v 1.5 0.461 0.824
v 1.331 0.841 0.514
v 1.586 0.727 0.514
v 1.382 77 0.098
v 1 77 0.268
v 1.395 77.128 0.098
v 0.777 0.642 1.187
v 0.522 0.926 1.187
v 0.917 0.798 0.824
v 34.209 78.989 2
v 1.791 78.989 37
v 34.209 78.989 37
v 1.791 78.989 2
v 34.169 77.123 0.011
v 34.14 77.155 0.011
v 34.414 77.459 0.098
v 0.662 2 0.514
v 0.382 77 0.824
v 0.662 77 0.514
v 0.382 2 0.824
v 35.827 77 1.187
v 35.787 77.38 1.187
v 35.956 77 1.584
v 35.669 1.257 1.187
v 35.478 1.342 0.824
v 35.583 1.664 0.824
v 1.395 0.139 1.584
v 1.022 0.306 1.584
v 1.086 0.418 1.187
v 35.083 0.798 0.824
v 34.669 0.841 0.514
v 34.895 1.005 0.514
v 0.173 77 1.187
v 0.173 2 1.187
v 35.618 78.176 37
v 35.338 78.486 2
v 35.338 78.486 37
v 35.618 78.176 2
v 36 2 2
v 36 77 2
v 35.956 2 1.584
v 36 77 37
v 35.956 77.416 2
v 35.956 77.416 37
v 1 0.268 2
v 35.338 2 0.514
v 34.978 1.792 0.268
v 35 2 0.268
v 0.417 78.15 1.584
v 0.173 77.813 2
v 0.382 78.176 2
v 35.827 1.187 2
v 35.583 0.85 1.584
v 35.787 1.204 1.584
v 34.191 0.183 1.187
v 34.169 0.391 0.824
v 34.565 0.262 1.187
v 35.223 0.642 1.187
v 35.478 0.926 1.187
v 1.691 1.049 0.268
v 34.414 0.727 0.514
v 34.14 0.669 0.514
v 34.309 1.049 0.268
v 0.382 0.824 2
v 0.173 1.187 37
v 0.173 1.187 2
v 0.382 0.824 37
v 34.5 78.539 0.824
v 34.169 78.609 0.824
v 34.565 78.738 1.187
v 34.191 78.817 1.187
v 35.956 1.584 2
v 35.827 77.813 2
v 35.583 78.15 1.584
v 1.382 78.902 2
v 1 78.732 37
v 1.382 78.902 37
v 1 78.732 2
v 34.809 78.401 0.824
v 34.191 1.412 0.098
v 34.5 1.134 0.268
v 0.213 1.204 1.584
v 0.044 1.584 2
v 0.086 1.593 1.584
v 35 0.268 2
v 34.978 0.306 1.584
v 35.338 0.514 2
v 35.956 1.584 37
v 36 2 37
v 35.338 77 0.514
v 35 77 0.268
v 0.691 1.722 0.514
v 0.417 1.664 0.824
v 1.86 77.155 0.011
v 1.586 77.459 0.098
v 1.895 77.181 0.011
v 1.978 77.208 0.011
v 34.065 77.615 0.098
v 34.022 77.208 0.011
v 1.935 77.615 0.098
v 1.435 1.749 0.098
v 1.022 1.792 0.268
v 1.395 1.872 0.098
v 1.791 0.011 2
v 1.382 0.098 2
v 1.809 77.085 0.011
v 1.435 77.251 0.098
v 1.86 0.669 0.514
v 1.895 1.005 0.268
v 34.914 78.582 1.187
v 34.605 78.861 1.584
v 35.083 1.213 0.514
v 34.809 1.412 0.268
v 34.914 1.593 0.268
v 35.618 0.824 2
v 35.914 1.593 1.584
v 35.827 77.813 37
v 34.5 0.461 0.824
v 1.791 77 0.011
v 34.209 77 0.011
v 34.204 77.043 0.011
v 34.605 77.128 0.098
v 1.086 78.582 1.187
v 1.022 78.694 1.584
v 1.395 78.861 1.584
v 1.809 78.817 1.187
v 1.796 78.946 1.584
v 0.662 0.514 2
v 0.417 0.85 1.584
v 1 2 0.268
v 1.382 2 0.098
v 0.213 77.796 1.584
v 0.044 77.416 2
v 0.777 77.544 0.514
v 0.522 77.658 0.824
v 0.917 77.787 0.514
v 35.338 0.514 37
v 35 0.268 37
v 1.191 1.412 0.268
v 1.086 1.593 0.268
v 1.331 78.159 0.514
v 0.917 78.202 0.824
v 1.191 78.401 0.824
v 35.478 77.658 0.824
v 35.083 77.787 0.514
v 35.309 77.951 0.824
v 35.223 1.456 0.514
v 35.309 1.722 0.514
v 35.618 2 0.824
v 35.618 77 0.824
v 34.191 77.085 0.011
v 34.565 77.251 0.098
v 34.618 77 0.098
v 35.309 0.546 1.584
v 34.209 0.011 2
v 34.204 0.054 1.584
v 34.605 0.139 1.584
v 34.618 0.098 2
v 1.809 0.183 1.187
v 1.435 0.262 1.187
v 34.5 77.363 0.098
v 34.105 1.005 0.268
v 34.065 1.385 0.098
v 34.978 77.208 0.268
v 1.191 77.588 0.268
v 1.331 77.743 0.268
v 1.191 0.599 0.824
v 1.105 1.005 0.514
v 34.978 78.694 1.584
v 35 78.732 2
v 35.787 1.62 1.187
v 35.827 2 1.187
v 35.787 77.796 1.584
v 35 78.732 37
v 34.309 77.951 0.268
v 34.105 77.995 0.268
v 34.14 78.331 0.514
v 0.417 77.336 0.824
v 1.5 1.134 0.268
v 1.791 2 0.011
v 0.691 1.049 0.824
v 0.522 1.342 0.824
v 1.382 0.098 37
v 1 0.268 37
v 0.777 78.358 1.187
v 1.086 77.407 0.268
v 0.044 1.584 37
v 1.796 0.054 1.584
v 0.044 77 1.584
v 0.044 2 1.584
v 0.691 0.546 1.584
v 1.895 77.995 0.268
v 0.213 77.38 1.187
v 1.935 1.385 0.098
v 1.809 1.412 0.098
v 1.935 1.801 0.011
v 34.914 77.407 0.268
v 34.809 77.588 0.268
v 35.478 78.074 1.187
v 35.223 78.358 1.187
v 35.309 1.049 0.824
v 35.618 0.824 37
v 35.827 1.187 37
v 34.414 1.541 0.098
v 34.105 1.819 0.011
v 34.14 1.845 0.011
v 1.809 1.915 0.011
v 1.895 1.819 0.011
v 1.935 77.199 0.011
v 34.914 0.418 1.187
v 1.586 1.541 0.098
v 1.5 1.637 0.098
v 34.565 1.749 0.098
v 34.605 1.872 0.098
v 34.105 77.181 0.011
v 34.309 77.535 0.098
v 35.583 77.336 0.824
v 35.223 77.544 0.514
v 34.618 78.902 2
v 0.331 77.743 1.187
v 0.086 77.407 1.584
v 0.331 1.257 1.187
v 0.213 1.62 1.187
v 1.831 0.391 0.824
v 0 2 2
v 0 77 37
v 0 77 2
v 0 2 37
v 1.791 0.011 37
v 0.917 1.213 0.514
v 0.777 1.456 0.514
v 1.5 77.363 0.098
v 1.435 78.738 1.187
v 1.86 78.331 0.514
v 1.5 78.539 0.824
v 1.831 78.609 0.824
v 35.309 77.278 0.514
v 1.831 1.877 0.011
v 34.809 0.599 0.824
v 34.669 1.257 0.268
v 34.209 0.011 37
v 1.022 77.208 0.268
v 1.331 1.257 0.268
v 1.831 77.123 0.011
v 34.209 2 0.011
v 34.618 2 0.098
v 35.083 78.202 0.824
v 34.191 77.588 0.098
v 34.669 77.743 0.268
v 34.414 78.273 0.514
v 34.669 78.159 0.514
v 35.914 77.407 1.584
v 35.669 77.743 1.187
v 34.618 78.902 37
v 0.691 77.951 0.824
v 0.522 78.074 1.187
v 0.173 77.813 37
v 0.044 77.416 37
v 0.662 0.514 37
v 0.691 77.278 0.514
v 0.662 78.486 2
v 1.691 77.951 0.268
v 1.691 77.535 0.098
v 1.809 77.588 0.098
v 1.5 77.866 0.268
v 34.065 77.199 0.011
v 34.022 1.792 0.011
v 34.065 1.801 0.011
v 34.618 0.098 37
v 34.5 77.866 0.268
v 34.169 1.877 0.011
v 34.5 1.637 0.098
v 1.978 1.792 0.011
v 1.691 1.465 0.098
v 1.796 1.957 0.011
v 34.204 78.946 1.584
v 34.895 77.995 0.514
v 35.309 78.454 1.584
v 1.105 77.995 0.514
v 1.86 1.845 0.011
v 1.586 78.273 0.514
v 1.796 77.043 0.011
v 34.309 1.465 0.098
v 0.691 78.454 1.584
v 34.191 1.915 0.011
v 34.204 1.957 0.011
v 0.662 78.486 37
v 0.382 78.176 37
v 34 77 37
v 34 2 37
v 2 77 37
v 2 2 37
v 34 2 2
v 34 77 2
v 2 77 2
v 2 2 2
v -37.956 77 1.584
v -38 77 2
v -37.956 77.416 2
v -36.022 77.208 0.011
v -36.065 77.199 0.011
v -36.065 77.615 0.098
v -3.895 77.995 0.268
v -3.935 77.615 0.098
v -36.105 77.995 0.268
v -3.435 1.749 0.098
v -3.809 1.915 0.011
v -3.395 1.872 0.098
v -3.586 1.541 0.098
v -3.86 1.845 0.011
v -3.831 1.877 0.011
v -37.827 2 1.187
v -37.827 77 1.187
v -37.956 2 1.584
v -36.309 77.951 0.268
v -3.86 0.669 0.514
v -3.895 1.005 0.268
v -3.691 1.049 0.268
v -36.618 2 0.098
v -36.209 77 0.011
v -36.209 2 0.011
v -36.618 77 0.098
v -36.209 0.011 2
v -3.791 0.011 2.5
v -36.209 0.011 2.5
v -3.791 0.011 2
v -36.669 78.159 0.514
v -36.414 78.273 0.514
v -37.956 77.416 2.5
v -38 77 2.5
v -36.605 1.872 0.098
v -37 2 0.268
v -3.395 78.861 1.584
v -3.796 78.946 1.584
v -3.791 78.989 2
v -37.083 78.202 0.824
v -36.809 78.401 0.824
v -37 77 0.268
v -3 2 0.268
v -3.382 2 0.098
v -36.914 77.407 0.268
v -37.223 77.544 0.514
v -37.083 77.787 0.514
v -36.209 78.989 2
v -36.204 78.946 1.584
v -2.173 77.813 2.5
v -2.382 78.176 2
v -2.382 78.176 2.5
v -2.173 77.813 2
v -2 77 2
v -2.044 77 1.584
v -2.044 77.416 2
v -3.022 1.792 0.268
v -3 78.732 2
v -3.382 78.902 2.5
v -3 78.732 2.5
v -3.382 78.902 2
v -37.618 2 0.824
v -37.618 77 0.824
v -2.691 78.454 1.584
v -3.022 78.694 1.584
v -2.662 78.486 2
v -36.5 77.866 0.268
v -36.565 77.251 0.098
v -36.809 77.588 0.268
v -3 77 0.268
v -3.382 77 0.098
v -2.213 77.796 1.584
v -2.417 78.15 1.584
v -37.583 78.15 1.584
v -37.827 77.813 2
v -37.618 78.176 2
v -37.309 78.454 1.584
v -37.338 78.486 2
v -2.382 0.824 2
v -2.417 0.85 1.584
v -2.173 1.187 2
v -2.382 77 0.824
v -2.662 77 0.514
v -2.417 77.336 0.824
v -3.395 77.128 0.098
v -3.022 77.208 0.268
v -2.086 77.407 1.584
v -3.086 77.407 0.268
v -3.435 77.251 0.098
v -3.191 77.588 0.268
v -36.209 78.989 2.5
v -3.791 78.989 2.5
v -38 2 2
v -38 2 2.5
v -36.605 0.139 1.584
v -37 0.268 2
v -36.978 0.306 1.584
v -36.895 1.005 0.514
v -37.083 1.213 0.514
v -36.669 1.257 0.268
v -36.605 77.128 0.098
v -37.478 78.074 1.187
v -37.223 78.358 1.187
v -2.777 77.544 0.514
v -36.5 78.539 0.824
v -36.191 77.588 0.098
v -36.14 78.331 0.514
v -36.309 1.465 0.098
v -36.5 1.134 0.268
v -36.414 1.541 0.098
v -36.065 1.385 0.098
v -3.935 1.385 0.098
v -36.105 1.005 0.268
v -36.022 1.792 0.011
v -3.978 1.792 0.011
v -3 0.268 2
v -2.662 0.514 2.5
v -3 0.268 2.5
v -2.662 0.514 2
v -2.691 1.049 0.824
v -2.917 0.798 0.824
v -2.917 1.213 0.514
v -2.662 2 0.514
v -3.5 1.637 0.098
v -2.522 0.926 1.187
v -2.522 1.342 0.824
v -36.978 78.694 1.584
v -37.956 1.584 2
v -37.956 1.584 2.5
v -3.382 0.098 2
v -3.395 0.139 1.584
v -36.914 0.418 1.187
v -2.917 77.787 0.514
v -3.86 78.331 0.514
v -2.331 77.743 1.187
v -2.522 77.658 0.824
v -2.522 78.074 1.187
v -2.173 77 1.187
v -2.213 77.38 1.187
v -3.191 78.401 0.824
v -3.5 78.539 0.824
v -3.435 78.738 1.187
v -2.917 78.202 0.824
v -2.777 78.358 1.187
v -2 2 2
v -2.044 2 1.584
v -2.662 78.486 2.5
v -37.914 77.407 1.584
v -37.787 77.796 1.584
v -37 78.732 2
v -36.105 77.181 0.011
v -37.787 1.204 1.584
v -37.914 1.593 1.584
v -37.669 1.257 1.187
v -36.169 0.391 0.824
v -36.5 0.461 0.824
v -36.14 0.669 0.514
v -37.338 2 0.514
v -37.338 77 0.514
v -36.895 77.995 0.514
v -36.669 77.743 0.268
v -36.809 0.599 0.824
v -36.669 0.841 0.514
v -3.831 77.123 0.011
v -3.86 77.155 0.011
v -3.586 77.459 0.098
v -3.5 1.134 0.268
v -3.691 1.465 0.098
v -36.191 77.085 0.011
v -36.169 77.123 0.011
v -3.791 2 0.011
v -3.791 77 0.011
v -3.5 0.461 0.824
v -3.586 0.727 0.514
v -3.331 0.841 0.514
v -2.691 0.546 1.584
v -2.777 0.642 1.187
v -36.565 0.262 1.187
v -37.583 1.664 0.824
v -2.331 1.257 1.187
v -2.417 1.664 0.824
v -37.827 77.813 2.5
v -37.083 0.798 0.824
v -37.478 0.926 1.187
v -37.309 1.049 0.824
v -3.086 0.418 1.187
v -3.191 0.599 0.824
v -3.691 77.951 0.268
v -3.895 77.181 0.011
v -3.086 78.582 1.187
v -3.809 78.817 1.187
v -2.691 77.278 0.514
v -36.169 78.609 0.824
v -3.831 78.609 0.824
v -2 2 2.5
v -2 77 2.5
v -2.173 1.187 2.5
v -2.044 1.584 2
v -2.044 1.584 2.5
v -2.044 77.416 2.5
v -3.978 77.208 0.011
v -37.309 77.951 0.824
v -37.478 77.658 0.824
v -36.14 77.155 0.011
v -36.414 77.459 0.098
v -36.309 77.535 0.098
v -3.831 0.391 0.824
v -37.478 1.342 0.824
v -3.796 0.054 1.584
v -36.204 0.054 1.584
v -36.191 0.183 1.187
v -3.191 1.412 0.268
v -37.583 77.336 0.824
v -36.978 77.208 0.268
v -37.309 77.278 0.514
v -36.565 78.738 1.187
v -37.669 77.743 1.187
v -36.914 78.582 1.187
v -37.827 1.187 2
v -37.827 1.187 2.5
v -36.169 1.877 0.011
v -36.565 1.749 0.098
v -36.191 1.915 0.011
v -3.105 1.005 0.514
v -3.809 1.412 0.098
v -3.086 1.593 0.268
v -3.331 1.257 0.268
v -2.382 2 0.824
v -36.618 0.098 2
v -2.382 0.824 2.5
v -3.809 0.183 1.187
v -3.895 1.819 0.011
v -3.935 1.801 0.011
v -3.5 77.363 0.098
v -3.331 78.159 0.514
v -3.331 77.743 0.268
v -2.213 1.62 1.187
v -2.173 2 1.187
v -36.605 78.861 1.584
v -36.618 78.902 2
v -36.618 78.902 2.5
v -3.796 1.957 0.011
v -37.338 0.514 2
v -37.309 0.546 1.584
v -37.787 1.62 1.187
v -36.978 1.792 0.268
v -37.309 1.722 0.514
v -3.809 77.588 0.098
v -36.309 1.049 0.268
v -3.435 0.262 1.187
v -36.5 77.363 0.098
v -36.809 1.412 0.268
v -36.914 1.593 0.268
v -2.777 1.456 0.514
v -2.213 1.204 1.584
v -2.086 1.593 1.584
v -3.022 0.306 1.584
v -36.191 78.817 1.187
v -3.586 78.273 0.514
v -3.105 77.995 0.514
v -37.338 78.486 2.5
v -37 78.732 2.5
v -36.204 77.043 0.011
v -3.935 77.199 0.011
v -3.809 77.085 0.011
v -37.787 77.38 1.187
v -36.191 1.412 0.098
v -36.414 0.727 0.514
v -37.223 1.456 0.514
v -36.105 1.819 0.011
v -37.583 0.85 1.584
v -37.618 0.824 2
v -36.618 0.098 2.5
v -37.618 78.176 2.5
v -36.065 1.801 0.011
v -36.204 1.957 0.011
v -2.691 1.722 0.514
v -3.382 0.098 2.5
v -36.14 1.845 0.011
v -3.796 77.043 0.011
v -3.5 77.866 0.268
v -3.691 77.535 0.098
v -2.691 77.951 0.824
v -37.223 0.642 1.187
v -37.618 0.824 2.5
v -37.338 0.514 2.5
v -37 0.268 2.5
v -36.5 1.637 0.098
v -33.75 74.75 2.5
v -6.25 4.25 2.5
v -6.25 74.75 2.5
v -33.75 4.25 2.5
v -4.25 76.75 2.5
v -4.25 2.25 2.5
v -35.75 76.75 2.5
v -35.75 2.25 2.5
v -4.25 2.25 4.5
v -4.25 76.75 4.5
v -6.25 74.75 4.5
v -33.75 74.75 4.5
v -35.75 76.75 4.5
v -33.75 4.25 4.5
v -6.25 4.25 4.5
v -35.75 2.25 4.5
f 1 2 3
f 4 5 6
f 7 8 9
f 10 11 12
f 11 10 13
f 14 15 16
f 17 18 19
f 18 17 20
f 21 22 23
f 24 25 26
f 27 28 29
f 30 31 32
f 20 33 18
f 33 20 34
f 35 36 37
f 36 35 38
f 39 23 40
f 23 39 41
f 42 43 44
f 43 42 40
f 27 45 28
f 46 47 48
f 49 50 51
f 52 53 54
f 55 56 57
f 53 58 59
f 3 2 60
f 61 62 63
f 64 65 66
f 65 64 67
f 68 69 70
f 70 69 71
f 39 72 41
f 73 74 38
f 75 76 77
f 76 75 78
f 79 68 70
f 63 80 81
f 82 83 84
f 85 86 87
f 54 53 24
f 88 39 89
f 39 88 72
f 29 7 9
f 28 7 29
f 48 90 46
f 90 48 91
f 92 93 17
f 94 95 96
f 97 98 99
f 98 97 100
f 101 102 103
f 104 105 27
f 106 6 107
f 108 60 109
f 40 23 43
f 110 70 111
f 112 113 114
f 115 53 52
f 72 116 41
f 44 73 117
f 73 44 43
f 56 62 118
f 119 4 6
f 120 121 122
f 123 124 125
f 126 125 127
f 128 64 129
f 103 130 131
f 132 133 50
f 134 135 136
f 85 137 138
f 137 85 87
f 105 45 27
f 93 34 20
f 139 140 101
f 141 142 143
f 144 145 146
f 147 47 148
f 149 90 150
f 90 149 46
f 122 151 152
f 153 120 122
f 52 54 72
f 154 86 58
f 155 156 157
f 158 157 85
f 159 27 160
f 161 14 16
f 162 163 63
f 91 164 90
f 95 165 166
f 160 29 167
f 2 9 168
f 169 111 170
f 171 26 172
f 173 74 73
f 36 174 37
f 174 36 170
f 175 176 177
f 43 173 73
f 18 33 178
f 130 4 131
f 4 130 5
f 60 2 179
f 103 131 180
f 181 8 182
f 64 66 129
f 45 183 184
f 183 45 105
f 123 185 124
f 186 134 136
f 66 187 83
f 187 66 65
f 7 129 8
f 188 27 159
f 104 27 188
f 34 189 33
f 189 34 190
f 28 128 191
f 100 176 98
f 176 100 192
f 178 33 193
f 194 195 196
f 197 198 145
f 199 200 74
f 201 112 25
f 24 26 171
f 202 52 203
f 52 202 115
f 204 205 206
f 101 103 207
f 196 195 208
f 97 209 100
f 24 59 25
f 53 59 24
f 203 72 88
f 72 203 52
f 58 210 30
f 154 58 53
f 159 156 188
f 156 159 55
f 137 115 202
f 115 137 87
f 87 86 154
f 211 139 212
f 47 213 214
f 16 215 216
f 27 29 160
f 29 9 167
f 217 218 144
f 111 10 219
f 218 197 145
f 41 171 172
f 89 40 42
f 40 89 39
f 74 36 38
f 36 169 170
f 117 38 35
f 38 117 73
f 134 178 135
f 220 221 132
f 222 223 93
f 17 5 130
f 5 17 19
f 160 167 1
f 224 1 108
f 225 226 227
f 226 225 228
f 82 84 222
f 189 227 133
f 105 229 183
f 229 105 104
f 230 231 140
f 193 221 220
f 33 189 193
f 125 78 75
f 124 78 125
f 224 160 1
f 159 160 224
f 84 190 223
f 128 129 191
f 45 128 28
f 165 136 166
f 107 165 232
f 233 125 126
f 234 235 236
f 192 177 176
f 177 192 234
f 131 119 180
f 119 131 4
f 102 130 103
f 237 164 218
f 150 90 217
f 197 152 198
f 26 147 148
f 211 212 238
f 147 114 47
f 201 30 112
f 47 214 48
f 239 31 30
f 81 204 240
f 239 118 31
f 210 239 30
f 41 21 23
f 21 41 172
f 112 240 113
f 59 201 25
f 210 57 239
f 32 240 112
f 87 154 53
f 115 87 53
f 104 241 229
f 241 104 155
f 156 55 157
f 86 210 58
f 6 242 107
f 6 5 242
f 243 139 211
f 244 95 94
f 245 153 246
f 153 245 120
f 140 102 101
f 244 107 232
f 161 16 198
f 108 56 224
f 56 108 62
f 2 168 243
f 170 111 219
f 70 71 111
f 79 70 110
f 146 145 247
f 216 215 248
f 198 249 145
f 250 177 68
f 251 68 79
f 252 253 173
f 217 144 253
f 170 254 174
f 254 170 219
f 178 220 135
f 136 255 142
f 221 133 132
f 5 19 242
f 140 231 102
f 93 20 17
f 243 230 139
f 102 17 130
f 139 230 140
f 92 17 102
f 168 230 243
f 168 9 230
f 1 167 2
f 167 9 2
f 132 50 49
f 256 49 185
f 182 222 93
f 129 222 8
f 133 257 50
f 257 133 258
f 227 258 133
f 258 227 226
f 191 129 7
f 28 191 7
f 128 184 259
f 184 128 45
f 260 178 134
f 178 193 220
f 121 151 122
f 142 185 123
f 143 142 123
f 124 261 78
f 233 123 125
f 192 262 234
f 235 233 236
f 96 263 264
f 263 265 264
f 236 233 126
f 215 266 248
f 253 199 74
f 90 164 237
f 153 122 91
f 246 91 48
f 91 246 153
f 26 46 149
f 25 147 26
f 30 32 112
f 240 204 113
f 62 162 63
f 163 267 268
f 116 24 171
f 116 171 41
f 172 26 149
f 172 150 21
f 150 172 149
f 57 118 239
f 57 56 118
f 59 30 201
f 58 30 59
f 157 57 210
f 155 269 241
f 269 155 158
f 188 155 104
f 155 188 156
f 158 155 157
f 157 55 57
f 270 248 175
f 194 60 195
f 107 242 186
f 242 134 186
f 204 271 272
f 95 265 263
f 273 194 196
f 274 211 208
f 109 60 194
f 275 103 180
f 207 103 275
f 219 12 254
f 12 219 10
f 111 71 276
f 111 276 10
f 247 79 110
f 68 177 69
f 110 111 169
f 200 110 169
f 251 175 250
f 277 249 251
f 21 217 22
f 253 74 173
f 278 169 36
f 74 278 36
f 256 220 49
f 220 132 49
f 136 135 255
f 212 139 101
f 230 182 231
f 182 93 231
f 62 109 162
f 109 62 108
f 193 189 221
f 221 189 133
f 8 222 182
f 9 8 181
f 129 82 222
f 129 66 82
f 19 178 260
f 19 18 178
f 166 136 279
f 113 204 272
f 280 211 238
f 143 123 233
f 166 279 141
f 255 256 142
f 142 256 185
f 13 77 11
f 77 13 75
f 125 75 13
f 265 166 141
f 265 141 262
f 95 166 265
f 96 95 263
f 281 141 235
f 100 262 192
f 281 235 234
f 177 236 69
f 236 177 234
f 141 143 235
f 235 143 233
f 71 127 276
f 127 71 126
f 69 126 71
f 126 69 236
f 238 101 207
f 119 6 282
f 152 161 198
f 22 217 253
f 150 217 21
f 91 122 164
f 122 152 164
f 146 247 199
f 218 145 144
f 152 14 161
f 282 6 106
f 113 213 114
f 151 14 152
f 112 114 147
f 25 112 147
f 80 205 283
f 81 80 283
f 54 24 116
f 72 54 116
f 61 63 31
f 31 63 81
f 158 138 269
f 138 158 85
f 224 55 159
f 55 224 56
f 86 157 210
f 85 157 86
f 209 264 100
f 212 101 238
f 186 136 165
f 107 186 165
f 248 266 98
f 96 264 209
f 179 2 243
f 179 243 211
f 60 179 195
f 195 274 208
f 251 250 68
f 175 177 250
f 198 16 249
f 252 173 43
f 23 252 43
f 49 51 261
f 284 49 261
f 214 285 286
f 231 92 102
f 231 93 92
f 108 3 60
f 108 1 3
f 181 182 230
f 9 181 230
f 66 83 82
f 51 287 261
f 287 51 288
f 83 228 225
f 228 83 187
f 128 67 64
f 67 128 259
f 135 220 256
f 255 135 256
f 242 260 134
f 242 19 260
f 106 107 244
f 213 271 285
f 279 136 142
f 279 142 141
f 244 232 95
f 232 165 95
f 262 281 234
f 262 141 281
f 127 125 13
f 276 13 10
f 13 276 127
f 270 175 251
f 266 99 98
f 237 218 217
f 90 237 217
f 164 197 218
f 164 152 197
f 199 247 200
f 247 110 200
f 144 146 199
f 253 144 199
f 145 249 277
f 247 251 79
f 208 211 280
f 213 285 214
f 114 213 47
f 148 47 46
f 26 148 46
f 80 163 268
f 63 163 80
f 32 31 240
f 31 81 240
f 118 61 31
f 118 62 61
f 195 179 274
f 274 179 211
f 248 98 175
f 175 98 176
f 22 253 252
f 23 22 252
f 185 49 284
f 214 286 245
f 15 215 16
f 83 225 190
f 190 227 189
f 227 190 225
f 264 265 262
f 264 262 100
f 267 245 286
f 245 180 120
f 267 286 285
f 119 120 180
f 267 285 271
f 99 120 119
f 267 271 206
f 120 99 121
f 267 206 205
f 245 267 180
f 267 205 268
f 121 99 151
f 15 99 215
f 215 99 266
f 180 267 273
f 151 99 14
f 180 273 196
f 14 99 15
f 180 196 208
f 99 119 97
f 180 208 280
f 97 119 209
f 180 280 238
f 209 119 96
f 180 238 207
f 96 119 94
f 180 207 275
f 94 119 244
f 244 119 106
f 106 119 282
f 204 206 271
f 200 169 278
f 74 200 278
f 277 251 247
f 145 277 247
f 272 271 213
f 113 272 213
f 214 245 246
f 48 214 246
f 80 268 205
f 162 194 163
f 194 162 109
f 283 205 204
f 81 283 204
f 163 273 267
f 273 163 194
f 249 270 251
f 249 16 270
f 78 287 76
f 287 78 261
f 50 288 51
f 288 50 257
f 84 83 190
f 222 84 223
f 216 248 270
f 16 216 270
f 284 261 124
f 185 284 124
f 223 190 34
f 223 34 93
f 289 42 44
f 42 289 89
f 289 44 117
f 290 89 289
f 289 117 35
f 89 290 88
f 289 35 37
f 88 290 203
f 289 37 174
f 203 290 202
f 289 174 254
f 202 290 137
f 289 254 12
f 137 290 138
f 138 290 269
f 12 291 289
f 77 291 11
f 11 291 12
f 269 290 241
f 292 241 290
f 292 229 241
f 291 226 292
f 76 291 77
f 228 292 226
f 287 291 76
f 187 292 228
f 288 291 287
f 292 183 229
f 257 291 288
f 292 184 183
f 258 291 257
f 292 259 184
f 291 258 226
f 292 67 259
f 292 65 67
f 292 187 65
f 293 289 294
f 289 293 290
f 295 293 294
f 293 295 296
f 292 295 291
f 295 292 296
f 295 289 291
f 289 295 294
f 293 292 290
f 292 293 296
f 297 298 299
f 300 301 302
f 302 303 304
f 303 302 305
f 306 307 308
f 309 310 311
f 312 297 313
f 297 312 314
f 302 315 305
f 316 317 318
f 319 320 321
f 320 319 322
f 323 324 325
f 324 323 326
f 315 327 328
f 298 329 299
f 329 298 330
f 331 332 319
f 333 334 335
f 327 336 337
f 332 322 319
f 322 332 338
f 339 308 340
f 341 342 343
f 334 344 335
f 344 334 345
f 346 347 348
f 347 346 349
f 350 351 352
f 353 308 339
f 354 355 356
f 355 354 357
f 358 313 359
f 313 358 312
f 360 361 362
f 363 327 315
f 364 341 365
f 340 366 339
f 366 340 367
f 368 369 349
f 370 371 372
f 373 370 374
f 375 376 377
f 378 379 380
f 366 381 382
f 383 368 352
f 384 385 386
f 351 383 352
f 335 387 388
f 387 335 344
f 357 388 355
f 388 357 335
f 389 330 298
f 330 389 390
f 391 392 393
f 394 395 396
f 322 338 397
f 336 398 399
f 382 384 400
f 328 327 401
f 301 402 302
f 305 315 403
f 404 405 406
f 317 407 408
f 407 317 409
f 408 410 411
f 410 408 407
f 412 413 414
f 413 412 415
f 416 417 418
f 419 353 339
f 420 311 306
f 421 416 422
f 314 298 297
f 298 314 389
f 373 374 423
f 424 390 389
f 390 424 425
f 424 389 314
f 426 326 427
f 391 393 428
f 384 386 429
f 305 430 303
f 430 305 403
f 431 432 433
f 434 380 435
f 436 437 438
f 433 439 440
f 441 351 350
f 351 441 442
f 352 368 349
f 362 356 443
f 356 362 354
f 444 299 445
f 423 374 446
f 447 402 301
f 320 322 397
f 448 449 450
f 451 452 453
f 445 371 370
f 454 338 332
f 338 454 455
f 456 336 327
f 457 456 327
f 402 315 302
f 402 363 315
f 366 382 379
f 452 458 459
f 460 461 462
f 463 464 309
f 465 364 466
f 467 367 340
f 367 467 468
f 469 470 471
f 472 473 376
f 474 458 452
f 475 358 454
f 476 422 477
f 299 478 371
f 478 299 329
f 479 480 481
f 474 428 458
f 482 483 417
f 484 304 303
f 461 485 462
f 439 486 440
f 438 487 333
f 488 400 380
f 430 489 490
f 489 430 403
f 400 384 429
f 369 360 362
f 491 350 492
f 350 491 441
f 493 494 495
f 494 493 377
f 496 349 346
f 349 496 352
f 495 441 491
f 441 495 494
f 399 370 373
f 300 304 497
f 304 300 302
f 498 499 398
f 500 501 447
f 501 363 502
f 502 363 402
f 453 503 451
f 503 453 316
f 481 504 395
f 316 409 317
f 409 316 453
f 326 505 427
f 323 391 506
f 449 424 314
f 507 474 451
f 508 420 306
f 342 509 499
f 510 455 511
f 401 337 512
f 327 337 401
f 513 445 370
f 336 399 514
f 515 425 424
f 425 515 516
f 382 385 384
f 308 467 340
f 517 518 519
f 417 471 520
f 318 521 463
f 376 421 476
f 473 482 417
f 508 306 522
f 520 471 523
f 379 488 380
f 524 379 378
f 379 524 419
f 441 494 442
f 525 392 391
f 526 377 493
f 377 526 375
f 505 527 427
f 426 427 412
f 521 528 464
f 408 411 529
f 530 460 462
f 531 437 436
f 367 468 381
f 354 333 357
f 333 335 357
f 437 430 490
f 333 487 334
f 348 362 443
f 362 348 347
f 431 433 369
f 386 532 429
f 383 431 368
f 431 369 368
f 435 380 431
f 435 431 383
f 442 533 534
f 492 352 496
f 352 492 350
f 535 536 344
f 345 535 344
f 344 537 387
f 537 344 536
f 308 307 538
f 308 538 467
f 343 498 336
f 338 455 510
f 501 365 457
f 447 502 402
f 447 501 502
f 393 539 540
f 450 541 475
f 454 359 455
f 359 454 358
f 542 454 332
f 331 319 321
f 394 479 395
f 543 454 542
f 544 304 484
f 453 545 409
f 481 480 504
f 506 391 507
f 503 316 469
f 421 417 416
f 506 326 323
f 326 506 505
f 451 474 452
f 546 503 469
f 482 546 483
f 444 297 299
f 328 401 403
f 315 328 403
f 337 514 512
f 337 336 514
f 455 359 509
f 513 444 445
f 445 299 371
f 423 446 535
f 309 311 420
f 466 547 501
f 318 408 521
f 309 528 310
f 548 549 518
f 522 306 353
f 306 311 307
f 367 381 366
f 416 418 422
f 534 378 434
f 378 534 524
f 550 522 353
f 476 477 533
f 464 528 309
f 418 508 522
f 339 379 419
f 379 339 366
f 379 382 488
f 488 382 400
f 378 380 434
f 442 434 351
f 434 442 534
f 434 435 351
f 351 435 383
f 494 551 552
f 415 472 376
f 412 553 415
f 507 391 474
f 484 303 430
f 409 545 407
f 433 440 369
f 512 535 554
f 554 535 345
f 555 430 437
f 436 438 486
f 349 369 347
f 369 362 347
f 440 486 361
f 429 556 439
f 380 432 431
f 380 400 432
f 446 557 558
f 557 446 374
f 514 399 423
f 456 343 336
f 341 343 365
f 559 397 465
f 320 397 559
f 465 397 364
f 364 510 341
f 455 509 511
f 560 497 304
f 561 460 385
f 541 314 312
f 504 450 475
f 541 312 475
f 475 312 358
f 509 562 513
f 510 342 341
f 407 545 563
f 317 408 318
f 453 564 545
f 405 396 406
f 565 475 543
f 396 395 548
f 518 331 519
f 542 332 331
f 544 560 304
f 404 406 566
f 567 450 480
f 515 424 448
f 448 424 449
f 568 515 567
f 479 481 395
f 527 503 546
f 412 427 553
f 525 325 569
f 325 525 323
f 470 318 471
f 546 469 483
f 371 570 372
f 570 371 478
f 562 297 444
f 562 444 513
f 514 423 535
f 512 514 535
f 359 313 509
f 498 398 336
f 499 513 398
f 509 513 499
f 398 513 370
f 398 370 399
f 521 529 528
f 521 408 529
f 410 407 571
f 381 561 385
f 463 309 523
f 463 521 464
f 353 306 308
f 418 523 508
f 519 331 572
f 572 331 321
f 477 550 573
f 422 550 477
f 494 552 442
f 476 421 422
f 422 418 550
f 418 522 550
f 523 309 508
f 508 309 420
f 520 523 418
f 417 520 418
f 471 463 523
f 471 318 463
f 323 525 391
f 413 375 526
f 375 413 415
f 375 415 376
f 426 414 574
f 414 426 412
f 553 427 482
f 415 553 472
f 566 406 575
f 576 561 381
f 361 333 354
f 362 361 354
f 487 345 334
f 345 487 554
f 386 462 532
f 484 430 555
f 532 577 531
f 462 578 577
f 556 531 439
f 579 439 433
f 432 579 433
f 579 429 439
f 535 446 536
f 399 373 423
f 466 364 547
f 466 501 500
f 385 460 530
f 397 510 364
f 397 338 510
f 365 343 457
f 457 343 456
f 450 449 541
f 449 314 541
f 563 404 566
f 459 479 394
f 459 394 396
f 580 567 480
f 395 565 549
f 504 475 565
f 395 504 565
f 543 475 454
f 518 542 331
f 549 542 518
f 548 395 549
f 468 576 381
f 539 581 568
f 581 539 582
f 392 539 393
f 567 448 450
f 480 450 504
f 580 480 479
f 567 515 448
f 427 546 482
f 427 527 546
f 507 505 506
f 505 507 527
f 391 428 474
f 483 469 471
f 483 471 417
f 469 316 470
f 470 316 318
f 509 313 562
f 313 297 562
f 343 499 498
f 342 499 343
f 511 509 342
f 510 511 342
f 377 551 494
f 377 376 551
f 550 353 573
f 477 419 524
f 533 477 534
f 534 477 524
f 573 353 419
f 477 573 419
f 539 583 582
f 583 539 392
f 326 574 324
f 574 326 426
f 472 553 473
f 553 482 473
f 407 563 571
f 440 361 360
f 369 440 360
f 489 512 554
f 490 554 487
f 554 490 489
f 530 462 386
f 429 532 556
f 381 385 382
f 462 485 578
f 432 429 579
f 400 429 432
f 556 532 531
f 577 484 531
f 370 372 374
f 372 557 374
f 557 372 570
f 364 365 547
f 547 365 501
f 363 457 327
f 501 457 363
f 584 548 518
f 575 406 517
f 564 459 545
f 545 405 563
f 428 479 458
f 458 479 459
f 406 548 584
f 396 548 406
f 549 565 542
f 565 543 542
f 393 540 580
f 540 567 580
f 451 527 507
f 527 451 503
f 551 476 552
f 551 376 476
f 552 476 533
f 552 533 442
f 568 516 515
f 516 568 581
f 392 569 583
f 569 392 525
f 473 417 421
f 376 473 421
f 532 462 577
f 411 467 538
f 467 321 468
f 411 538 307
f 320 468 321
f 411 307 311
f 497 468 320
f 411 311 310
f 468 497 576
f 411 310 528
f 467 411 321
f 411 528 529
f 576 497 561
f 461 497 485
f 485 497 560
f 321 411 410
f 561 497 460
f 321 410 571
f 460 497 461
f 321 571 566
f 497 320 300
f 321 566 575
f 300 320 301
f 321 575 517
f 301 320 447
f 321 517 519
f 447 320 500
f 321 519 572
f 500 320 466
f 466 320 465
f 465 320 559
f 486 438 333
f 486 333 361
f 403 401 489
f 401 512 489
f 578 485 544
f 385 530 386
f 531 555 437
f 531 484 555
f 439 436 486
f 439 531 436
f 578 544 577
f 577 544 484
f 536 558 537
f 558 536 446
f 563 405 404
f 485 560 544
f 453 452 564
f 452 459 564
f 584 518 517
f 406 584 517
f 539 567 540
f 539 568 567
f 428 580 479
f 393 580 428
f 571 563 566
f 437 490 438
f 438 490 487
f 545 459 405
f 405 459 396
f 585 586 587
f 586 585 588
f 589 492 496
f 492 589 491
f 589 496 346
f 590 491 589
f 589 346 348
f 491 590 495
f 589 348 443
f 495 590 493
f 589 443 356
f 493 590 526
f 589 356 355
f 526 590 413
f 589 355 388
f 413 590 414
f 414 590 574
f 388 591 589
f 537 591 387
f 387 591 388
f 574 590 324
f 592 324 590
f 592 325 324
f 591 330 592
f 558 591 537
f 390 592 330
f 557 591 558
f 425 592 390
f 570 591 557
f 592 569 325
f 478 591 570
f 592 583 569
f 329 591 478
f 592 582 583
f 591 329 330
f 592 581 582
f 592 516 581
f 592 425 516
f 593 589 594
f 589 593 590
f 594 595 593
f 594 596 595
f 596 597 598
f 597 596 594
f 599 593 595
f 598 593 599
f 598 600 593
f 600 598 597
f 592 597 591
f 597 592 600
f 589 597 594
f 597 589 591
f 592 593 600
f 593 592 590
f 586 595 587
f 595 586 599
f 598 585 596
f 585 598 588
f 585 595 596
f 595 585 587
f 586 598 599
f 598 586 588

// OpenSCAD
//Procedural Project Box v1
//CudaTox, 2017

inside_width = 32;
inside_length = 75;
inside_height = 35;
thickness = 2;                  //Wall thickness
radius = 2;                     //Fillet radius. Should not be larger than thickness
extra_lid_thickness = 0.5;      //Extra lid thickness above thickness. 
                                //You may wan to tweak this to account for large chamfer radius.

outside_width = inside_width + thickness * 2;
outside_length = inside_length + thickness * 2;


module rounded_box(x,y,z,r){
    translate([r,r,r])
    minkowski(){
        cube([x-r*2,y-r*2,z-r*2]);
        sphere(r=r, $fs=0.1);
    }
}

module main_box(){
    difference(){
        //cube([outside_width, outside_length, inside_height + thickness * 2]);
        difference(){
            rounded_box(outside_width, outside_length, inside_height + thickness + 2, radius);
            translate([0,0,inside_height + thickness])
            cube([outside_width, outside_length, inside_height + thickness * 2]);
        }
        translate([thickness, thickness, thickness])
        cube([inside_width, inside_length, inside_height + thickness]);
    }
}

module lid(){
//Lid.
difference(){
    rounded_box(outside_width, outside_length, thickness * 4, radius);
    translate([0,0, thickness + extra_lid_thickness])
        cube([outside_width, outside_length, inside_height + thickness * 4]);
}
//Lip
lip_tol = 0.5;
lip_width = inside_width - lip_tol;
lip_length = inside_length - lip_tol;
translate([(outside_width - lip_width)/2,(outside_length - lip_length)/2, thickness + 0.5])
    difference(){
        cube([lip_width, lip_length, 2]);
        translate([thickness, thickness, 0])
            cube([lip_width-thickness*2, lip_length-thickness*2, 2]);
    }

}

main_box();
translate([-outside_width-2,0,0])
    lid();
